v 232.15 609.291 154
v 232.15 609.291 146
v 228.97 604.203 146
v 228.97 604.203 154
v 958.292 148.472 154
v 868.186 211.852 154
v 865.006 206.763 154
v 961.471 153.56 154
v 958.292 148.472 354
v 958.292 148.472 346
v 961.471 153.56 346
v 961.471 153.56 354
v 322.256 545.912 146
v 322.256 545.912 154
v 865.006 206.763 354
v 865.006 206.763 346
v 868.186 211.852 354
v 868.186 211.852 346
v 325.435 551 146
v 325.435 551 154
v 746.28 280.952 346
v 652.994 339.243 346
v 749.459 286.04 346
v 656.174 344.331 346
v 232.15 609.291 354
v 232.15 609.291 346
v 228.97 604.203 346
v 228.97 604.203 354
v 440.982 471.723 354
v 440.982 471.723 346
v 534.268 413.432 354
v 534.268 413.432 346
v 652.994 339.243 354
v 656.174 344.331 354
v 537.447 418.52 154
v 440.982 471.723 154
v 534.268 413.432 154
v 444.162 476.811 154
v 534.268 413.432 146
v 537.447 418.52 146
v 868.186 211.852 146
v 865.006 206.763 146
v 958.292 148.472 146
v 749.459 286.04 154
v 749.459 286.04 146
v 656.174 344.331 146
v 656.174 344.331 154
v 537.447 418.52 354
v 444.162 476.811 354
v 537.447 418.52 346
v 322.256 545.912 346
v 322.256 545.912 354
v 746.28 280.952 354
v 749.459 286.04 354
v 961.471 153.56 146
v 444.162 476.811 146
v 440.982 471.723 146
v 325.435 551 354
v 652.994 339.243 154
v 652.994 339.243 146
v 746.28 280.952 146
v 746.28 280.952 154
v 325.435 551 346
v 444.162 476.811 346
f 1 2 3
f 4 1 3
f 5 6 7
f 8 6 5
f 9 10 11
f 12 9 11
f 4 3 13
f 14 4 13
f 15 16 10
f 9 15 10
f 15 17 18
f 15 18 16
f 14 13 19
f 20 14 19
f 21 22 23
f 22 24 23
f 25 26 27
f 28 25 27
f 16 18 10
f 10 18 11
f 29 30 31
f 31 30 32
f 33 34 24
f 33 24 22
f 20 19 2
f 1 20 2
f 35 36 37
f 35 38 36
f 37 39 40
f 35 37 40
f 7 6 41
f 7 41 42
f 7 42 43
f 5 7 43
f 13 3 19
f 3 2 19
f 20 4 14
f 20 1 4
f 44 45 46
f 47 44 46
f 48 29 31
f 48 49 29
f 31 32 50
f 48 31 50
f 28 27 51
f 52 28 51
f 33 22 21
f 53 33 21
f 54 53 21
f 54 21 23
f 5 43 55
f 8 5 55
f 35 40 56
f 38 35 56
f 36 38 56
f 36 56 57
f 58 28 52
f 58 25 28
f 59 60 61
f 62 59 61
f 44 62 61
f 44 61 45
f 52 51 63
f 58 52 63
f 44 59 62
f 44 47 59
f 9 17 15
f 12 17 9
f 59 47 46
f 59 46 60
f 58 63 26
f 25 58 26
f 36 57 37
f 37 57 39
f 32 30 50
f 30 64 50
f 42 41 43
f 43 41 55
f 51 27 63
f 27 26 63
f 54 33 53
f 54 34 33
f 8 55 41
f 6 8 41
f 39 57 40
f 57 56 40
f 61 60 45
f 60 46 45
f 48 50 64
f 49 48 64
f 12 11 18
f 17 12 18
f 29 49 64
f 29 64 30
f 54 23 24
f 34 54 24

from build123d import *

# Parameters (mm, degrees)
S1_110X8X6_SCHEMATIC_START = 146
S1_110X8X6_SCHEMATIC_DEPTH = 8
S2_110X8X6_SCHEMATIC_START = 146
S2_110X8X6_SCHEMATIC_DEPTH = 8
S3_110X8X6_SCHEMATIC_START = 146
S3_110X8X6_SCHEMATIC_DEPTH = 8
S4_110X8X6_SCHEMATIC_START = 146
S4_110X8X6_SCHEMATIC_DEPTH = 8
S5_110X8X6_SCHEMATIC_START = 346
S5_110X8X6_SCHEMATIC_DEPTH = 8
S6_110X8X6_SCHEMATIC_START = 346
S6_110X8X6_SCHEMATIC_DEPTH = 8
S7_110X8X6_SCHEMATIC_START = 346
S7_110X8X6_SCHEMATIC_DEPTH = 8
S8_110X8X6_SCHEMATIC_START = 346
S8_110X8X6_SCHEMATIC_DEPTH = 8


with BuildPart() as part:
    # 草图1 → S1_110x8x6_SCHEMATIC (new body)
    with BuildSketch(Plane.XY.offset(S1_110X8X6_SCHEMATIC_START)):
        Polygon((228.970379508, 604.202695295), (322.255670085, 545.911576229), (325.43518567, 550.999864806), (232.149895093, 609.290983872), align=None)
    extrude(amount=S1_110X8X6_SCHEMATIC_DEPTH)


with BuildPart() as body_2:
    # 草图2 → S2_110x8x6_SCHEMATIC (new body)
    with BuildSketch(Plane.XY.offset(S2_110X8X6_SCHEMATIC_START)):
        Polygon((440.982403547, 471.722879236), (534.267694124, 413.431760171), (537.447209709, 418.520048748), (444.161919132, 476.811167813), align=None)
    extrude(amount=S2_110X8X6_SCHEMATIC_DEPTH)


with BuildPart() as body_3:
    # 草图3 → S3_110x8x6_SCHEMATIC (new body)
    with BuildSketch(Plane.XY.offset(S3_110X8X6_SCHEMATIC_START)):
        Polygon((652.994427586, 339.243063178), (746.279718163, 280.951944112), (749.459233748, 286.040232689), (656.173943171, 344.331351755), align=None)
    extrude(amount=S3_110X8X6_SCHEMATIC_DEPTH)


with BuildPart() as body_4:
    # 草图4 → S4_110x8x6_SCHEMATIC (new body)
    with BuildSketch(Plane.XY.offset(S4_110X8X6_SCHEMATIC_START)):
        Polygon((865.006451625, 206.76324712), (958.291742202, 148.472128054), (961.471257788, 153.560416631), (868.18596721, 211.851535697), align=None)
    extrude(amount=S4_110X8X6_SCHEMATIC_DEPTH)


with BuildPart() as body_5:
    # 草图5 → S5_110x8x6_SCHEMATIC (new body)
    with BuildSketch(Plane.XY.offset(S5_110X8X6_SCHEMATIC_START)):
        Polygon((228.970379508, 604.202695295), (322.255670085, 545.911576229), (325.43518567, 550.999864806), (232.149895093, 609.290983872), align=None)
    extrude(amount=S5_110X8X6_SCHEMATIC_DEPTH)


with BuildPart() as body_6:
    # 草图6 → S6_110x8x6_SCHEMATIC (new body)
    with BuildSketch(Plane.XY.offset(S6_110X8X6_SCHEMATIC_START)):
        Polygon((440.982403547, 471.722879236), (534.267694124, 413.431760171), (537.447209709, 418.520048748), (444.161919132, 476.811167813), align=None)
    extrude(amount=S6_110X8X6_SCHEMATIC_DEPTH)


with BuildPart() as body_7:
    # 草图7 → S7_110x8x6_SCHEMATIC (new body)
    with BuildSketch(Plane.XY.offset(S7_110X8X6_SCHEMATIC_START)):
        Polygon((652.994427586, 339.243063178), (746.279718163, 280.951944112), (749.459233748, 286.040232689), (656.173943171, 344.331351755), align=None)
    extrude(amount=S7_110X8X6_SCHEMATIC_DEPTH)


with BuildPart() as body_8:
    # 草图8 → S8_110x8x6_SCHEMATIC (new body)
    with BuildSketch(Plane.XY.offset(S8_110X8X6_SCHEMATIC_START)):
        Polygon((865.006451625, 206.76324712), (958.291742202, 148.472128054), (961.471257788, 153.560416631), (868.18596721, 211.851535697), align=None)
    extrude(amount=S8_110X8X6_SCHEMATIC_DEPTH)


solid = Compound([part.part, body_2.part, body_3.part, body_4.part, body_5.part, body_6.part, body_7.part, body_8.part])
